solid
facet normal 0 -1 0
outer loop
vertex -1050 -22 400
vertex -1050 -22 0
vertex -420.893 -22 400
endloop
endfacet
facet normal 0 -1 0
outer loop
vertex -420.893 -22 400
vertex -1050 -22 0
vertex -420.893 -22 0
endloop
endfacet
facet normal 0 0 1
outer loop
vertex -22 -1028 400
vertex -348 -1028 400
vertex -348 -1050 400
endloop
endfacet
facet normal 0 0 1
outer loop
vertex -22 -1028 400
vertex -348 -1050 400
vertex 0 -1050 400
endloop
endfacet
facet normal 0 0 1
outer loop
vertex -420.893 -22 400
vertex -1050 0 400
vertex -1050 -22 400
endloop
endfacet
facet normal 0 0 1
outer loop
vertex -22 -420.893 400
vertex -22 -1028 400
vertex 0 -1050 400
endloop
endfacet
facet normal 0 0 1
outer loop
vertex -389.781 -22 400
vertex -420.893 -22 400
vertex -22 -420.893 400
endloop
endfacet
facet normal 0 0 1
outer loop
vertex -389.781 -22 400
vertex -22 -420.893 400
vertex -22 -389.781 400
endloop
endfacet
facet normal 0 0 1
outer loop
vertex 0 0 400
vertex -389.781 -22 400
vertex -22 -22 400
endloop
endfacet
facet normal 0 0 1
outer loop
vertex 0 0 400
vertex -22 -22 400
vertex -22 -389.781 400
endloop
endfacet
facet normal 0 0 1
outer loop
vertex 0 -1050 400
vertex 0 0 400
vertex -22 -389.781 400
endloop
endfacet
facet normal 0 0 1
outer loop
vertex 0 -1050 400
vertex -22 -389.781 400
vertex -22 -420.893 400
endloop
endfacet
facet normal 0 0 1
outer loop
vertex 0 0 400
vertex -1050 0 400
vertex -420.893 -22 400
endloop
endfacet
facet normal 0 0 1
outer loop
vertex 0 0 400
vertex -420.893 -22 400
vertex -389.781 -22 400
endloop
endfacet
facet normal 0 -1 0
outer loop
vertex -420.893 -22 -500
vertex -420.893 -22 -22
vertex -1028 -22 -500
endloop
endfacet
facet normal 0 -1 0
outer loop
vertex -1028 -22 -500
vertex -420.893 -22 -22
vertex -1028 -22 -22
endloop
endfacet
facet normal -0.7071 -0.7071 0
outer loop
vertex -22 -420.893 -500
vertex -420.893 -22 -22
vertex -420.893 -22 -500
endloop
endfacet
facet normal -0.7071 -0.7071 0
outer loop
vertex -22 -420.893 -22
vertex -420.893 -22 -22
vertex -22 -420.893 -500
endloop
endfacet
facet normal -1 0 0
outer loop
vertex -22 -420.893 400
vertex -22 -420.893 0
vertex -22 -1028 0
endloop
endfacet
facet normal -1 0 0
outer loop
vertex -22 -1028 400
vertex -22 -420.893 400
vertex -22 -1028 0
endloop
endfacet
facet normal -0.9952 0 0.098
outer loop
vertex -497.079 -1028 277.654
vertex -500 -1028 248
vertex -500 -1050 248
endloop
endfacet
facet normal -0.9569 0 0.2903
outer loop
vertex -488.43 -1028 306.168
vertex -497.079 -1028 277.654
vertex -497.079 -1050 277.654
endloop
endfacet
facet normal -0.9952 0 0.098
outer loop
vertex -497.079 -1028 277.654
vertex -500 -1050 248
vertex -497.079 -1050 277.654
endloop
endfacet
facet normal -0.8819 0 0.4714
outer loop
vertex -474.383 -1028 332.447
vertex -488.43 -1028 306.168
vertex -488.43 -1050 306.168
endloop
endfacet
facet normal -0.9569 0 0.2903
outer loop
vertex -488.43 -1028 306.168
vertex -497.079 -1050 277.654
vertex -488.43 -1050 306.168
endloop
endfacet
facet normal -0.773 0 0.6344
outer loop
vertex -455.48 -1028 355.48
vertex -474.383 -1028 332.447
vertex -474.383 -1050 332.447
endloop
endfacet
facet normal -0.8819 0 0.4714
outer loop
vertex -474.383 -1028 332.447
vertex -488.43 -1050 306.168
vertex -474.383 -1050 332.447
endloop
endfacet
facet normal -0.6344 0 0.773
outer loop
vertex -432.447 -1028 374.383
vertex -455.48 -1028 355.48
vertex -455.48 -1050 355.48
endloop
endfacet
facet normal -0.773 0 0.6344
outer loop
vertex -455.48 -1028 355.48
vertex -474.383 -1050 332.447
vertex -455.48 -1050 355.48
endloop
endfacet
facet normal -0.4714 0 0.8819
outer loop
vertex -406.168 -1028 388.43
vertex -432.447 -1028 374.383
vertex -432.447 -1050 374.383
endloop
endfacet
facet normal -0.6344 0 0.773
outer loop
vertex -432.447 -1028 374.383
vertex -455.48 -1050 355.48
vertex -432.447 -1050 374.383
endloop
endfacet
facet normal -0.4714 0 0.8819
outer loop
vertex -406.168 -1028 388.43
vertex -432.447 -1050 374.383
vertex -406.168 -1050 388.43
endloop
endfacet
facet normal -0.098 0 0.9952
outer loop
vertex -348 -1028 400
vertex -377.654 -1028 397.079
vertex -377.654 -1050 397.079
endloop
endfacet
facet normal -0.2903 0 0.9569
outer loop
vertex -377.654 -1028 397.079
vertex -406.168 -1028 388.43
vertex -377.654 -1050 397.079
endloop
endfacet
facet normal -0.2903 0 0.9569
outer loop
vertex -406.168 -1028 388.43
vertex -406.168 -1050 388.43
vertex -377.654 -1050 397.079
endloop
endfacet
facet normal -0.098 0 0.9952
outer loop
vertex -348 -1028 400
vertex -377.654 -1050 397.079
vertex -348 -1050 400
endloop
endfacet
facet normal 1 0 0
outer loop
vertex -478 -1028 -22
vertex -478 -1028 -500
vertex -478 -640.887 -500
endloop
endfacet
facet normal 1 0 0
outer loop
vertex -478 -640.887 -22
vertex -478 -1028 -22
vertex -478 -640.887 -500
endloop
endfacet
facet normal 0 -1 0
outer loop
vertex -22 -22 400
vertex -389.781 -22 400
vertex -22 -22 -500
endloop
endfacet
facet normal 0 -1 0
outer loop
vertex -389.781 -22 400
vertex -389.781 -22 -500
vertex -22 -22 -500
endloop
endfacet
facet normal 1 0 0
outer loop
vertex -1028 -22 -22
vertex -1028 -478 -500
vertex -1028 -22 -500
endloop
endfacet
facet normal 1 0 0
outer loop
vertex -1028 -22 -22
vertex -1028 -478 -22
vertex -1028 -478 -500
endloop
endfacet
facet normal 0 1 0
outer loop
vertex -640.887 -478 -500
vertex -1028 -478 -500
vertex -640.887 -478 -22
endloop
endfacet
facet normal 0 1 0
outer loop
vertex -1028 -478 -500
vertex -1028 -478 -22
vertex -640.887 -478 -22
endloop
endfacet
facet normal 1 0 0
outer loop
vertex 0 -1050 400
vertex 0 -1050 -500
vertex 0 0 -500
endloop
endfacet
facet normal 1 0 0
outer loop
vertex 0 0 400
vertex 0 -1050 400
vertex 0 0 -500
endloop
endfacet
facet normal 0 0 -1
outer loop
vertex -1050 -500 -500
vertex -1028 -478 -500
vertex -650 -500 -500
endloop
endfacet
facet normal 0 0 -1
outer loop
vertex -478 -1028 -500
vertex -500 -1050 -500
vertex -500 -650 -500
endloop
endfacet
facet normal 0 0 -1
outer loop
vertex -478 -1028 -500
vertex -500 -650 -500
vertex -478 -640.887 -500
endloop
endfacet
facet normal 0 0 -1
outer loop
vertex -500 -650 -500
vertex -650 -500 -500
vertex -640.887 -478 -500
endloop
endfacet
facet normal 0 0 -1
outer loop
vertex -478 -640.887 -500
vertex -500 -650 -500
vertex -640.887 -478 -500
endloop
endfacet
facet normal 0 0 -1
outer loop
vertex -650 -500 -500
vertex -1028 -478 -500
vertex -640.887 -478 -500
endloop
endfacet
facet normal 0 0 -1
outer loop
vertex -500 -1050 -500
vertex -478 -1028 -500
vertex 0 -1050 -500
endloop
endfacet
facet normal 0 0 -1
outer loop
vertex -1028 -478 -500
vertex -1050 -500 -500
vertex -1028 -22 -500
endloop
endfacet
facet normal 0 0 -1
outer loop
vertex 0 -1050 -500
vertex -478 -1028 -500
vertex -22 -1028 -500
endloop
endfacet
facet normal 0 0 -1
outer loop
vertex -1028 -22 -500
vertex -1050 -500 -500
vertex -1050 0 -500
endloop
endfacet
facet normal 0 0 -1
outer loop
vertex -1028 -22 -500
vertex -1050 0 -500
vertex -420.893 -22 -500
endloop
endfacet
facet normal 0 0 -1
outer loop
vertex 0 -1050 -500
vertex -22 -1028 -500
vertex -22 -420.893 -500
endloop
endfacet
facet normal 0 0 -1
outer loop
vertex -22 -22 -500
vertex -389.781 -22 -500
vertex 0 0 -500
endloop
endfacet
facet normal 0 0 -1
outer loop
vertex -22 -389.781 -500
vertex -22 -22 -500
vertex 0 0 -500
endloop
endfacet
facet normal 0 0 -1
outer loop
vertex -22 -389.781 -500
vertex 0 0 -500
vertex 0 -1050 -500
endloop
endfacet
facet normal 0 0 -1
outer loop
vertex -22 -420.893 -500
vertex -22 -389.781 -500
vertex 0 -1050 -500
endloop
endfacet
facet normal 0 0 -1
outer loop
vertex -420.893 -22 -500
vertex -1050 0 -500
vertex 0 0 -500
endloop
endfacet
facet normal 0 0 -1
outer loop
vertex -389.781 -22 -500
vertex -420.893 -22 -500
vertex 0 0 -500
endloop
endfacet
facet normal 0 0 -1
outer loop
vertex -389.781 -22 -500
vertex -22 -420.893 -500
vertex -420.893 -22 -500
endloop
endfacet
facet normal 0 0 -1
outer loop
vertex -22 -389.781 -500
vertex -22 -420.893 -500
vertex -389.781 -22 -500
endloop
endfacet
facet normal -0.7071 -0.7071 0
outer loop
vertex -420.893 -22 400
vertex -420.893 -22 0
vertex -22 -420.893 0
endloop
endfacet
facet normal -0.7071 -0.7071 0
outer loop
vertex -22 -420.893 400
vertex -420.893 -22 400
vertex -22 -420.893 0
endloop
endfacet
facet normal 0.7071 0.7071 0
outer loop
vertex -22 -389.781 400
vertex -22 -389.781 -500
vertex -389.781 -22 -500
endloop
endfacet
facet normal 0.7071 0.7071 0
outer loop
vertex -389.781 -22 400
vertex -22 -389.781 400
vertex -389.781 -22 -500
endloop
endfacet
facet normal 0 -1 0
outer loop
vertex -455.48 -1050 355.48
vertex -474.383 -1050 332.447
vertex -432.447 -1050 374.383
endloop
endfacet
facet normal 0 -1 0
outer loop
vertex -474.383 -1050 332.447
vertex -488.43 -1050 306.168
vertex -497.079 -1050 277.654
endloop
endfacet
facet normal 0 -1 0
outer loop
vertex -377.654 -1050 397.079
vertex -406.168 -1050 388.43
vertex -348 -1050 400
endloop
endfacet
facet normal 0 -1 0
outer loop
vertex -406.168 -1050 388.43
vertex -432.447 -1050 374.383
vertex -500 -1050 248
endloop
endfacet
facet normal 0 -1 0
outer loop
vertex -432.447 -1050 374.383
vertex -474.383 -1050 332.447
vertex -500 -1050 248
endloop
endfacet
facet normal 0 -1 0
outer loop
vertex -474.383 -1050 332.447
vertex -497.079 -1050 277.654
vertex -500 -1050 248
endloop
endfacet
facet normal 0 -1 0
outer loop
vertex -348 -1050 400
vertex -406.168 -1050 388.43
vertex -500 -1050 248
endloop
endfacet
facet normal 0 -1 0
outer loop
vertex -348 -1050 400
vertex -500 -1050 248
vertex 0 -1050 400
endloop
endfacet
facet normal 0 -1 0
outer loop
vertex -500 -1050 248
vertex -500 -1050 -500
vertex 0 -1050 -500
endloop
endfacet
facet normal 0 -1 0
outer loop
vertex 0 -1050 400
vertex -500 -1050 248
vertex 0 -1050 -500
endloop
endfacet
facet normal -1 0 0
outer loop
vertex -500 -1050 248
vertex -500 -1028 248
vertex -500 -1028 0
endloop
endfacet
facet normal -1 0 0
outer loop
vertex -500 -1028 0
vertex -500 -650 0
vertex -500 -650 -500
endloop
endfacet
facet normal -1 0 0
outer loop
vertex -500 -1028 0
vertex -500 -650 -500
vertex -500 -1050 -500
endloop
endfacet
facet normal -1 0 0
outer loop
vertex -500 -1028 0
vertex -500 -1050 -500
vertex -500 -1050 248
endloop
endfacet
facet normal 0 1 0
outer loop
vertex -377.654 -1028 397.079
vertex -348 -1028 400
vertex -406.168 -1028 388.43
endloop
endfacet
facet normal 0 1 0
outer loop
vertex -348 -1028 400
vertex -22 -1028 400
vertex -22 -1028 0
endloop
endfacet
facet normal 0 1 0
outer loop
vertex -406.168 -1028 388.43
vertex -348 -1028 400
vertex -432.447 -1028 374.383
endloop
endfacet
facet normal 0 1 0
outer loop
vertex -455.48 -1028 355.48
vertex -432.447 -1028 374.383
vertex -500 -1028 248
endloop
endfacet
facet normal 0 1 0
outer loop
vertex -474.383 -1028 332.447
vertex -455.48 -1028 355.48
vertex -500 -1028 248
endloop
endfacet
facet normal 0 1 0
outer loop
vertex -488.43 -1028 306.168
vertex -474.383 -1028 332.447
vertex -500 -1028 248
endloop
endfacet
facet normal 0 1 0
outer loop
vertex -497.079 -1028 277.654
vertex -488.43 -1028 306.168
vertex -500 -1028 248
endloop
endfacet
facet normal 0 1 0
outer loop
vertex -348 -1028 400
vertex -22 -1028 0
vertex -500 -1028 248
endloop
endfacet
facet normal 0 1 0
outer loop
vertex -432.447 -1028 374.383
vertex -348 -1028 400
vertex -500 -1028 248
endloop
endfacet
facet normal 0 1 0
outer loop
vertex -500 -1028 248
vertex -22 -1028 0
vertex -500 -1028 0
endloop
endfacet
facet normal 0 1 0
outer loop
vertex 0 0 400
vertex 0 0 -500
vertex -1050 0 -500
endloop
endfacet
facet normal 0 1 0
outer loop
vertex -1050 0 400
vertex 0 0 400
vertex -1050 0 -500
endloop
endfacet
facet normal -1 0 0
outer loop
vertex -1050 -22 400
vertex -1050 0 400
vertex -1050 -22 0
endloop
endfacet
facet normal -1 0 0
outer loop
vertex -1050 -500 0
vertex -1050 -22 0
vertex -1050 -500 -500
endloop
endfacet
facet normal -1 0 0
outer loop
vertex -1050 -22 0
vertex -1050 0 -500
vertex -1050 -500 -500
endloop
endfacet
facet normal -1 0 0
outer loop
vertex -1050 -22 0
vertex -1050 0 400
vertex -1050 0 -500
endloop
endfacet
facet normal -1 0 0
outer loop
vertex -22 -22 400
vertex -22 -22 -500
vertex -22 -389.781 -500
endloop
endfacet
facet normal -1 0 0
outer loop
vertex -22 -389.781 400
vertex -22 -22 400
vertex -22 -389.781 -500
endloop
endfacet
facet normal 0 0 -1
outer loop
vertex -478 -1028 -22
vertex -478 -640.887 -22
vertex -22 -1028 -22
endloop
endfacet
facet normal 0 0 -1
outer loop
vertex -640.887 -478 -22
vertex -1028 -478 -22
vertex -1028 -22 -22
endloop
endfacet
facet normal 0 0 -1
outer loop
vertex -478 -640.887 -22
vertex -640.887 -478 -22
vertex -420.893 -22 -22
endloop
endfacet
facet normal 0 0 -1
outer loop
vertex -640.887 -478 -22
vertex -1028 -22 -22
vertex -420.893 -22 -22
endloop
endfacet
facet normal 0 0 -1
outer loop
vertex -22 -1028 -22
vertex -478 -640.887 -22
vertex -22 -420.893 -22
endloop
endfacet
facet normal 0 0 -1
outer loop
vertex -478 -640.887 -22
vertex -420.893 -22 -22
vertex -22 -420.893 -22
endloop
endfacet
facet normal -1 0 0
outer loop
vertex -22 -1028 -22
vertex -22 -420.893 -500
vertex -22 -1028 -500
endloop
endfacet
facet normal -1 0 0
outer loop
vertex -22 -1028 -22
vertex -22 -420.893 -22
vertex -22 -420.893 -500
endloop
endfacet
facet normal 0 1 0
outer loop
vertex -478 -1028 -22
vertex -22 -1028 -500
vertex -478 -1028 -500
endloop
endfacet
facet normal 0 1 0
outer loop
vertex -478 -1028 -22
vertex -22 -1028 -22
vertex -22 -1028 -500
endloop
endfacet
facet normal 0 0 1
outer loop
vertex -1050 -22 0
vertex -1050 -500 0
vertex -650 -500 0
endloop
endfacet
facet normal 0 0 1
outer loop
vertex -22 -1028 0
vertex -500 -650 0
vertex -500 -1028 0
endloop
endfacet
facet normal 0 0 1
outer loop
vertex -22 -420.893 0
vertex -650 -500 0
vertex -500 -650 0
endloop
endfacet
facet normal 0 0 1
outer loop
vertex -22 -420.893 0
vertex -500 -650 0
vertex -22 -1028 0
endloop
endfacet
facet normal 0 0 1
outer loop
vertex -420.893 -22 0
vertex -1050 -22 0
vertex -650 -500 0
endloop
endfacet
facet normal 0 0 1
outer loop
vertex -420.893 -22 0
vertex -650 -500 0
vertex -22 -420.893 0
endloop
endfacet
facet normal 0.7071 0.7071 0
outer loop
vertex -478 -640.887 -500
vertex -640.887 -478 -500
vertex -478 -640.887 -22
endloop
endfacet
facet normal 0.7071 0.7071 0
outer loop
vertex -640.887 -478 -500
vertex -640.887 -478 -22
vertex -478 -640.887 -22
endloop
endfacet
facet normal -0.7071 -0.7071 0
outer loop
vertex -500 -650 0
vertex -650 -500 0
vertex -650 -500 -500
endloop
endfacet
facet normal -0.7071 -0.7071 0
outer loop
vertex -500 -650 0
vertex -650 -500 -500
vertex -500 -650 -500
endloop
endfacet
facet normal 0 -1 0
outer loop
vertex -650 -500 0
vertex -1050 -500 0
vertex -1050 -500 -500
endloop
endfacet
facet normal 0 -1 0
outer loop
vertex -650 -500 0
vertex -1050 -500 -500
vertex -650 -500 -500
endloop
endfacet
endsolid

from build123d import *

# Parameters (mm, degrees)
F1_DEPTH = 500
F2_DEPTH = 400
F3_T     = -22
F5_DEPTH = 25


# Not quite as in the source:
# - a shell that OpenCascade refuses in one call is made with other operations: the cavity is built on its own and cut out


with BuildPart() as f1:
    # F0 (on Top) → F1 (new body)
    with BuildSketch(Plane.XY):
        Polygon((0, 0), (-1050, 0), (-1050, -22), (-420.8932188135, -22), (-22, -420.8932188135), (-22, -1028), (-500, -1028), (-500, -1050), (0, -1050), align=None)
        Polygon((-389.7805204412, -22), (-22, -22), (-22, -389.7805204412), align=None, mode=Mode.SUBTRACT)
        Polygon((-420.8932188135, -22), (-1050, -22), (-1050, -500), (-650, -500), (-500, -650), (-500, -1028), (-22, -1028), (-22, -420.8932188135), align=None)
    extrude(amount=-F1_DEPTH)

    # F0 (on Top) → F2 (join)
    with BuildSketch(Plane.XY):
        Polygon((0, 0), (-1050, 0), (-1050, -22), (-420.8932188135, -22), (-22, -420.8932188135), (-22, -1028), (-500, -1028), (-500, -1050), (0, -1050), align=None)
        Polygon((-389.7805204412, -22), (-22, -22), (-22, -389.7805204412), align=None, mode=Mode.SUBTRACT)
    extrude(amount=F2_DEPTH)

    # F3: a shell. OpenCascade refuses it in one call, so the cavity is built on its own and cut out:
    # the body offset inwards by the wall thickness, plus a prism from it out through each open face.
    f3_core = offset(f1.part, amount=F3_T, kind=Kind.INTERSECTION, mode=Mode.PRIVATE)
    f3_exits = [f3_core.faces().sort_by_distance(p)[0] for p in [
        (-463.695201, -463.695201, -478),
    ]]
    add(f3_core, mode=Mode.SUBTRACT)
    extrude(f3_exits, amount=-F3_T, mode=Mode.SUBTRACT)

    # F4 (on face) → F5 (cut)
    with BuildSketch(Plane.XZ.offset(1050)):
        with BuildLine():
            ThreePointArc((-500, 248), (-455.4802307404, 355.4802307404), (-348, 400))
            Line((-348, 400), (-500, 400))
            Line((-500, 400), (-500, 248))
        make_face()
    extrude(amount=-F5_DEPTH, mode=Mode.SUBTRACT)


solid = f1.part
